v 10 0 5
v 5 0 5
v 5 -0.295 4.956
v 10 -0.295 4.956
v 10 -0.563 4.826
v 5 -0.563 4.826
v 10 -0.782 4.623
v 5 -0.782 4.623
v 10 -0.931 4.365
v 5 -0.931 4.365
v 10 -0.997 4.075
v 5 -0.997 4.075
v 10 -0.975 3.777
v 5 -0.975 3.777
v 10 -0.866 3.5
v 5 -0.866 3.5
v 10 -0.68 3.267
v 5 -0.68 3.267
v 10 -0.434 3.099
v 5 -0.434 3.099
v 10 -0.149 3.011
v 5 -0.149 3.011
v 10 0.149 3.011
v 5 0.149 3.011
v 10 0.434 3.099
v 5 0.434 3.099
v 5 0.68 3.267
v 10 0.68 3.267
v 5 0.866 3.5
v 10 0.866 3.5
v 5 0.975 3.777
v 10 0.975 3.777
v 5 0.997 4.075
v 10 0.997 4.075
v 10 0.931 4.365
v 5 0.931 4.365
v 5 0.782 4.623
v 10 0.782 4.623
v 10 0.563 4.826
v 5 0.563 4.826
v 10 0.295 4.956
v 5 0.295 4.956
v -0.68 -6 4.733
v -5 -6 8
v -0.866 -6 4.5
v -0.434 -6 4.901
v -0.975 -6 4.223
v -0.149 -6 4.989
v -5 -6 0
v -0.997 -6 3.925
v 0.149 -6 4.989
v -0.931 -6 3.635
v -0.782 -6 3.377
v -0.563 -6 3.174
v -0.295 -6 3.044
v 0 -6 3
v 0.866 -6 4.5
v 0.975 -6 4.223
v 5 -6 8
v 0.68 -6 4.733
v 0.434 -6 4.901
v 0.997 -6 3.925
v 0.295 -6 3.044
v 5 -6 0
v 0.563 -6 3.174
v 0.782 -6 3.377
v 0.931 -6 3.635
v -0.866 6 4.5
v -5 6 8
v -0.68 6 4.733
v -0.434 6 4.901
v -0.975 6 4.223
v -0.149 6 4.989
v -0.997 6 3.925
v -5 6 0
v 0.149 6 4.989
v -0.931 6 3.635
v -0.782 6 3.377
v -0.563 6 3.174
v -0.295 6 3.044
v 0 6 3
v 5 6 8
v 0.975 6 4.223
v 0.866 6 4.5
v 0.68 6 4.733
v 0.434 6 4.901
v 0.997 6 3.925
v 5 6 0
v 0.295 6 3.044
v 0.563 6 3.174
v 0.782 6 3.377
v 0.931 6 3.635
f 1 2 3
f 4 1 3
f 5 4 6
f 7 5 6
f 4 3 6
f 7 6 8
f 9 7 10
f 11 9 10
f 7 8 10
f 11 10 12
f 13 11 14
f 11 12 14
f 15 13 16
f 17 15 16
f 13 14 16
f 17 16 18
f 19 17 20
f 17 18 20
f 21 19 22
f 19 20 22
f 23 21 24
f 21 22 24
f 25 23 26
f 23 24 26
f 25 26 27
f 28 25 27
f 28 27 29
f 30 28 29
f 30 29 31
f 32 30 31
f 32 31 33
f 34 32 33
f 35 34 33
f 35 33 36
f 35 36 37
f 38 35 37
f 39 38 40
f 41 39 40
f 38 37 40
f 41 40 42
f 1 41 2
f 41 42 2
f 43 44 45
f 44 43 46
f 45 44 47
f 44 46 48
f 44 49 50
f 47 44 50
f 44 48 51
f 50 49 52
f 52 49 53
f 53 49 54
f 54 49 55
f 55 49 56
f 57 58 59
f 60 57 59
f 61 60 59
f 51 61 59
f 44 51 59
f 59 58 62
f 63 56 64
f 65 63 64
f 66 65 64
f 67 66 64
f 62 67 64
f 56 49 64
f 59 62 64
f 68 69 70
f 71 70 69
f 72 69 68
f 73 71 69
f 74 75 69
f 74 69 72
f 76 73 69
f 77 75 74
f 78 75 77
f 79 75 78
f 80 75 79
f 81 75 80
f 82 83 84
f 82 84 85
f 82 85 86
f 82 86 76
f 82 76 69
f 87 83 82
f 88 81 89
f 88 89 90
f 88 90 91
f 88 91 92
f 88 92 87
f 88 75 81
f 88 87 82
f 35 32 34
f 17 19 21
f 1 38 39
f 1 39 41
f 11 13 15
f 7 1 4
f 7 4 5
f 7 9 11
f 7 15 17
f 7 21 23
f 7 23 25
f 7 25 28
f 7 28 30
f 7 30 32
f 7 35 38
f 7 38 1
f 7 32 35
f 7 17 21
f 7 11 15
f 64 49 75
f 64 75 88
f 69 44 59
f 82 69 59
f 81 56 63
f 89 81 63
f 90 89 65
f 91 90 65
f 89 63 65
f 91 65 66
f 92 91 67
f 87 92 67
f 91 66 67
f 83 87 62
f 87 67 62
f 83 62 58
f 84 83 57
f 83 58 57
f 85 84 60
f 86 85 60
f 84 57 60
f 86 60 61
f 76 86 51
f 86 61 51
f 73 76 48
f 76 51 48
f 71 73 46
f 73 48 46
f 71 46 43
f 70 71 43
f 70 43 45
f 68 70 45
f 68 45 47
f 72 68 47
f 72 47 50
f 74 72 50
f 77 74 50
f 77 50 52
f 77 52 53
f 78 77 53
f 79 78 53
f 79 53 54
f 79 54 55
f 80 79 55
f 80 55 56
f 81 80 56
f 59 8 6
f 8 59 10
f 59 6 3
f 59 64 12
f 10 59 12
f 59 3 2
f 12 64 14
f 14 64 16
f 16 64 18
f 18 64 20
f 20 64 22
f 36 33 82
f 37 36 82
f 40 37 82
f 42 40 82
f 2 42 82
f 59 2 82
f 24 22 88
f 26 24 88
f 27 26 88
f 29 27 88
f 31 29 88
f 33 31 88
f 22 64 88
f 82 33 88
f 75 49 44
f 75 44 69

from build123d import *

# Parameters (mm, degrees)
SKETCH_1_W          = 10
SKETCH_1_H          = 12
EXTRUDE_1_DEPTH     = 8
SKETCH_5_R          = 1
EXTRUDE_4_DEPTH     = 5
SKETCH_6_R          = 1
CUT_EXTRUDE_1_DEPTH = 16


with BuildPart() as part:
    # 草图1 → 凸台-拉伸1 (new body)
    with BuildSketch(Plane.XY):
        Rectangle(SKETCH_1_W, SKETCH_1_H)
    extrude(amount=EXTRUDE_1_DEPTH)

    # 草图5 → 凸台-拉伸4 (add)
    with BuildSketch(Plane(origin=(5, 0, 0), x_dir=(0, 0, -1), z_dir=(1, 0, 0))):
        with Locations(Location((-4, 0, 0), (0, 0, 180))):
            Circle(SKETCH_5_R)
    extrude(amount=EXTRUDE_4_DEPTH)

    # 草图6 → 切除-拉伸1 (cut)
    with BuildSketch(Plane.XZ.offset(6)):
        with Locations(Location((0, 4, 0), (0, 0, 270))):
            Circle(SKETCH_6_R)
    extrude(amount=-CUT_EXTRUDE_1_DEPTH, mode=Mode.SUBTRACT)


solid = part.part
